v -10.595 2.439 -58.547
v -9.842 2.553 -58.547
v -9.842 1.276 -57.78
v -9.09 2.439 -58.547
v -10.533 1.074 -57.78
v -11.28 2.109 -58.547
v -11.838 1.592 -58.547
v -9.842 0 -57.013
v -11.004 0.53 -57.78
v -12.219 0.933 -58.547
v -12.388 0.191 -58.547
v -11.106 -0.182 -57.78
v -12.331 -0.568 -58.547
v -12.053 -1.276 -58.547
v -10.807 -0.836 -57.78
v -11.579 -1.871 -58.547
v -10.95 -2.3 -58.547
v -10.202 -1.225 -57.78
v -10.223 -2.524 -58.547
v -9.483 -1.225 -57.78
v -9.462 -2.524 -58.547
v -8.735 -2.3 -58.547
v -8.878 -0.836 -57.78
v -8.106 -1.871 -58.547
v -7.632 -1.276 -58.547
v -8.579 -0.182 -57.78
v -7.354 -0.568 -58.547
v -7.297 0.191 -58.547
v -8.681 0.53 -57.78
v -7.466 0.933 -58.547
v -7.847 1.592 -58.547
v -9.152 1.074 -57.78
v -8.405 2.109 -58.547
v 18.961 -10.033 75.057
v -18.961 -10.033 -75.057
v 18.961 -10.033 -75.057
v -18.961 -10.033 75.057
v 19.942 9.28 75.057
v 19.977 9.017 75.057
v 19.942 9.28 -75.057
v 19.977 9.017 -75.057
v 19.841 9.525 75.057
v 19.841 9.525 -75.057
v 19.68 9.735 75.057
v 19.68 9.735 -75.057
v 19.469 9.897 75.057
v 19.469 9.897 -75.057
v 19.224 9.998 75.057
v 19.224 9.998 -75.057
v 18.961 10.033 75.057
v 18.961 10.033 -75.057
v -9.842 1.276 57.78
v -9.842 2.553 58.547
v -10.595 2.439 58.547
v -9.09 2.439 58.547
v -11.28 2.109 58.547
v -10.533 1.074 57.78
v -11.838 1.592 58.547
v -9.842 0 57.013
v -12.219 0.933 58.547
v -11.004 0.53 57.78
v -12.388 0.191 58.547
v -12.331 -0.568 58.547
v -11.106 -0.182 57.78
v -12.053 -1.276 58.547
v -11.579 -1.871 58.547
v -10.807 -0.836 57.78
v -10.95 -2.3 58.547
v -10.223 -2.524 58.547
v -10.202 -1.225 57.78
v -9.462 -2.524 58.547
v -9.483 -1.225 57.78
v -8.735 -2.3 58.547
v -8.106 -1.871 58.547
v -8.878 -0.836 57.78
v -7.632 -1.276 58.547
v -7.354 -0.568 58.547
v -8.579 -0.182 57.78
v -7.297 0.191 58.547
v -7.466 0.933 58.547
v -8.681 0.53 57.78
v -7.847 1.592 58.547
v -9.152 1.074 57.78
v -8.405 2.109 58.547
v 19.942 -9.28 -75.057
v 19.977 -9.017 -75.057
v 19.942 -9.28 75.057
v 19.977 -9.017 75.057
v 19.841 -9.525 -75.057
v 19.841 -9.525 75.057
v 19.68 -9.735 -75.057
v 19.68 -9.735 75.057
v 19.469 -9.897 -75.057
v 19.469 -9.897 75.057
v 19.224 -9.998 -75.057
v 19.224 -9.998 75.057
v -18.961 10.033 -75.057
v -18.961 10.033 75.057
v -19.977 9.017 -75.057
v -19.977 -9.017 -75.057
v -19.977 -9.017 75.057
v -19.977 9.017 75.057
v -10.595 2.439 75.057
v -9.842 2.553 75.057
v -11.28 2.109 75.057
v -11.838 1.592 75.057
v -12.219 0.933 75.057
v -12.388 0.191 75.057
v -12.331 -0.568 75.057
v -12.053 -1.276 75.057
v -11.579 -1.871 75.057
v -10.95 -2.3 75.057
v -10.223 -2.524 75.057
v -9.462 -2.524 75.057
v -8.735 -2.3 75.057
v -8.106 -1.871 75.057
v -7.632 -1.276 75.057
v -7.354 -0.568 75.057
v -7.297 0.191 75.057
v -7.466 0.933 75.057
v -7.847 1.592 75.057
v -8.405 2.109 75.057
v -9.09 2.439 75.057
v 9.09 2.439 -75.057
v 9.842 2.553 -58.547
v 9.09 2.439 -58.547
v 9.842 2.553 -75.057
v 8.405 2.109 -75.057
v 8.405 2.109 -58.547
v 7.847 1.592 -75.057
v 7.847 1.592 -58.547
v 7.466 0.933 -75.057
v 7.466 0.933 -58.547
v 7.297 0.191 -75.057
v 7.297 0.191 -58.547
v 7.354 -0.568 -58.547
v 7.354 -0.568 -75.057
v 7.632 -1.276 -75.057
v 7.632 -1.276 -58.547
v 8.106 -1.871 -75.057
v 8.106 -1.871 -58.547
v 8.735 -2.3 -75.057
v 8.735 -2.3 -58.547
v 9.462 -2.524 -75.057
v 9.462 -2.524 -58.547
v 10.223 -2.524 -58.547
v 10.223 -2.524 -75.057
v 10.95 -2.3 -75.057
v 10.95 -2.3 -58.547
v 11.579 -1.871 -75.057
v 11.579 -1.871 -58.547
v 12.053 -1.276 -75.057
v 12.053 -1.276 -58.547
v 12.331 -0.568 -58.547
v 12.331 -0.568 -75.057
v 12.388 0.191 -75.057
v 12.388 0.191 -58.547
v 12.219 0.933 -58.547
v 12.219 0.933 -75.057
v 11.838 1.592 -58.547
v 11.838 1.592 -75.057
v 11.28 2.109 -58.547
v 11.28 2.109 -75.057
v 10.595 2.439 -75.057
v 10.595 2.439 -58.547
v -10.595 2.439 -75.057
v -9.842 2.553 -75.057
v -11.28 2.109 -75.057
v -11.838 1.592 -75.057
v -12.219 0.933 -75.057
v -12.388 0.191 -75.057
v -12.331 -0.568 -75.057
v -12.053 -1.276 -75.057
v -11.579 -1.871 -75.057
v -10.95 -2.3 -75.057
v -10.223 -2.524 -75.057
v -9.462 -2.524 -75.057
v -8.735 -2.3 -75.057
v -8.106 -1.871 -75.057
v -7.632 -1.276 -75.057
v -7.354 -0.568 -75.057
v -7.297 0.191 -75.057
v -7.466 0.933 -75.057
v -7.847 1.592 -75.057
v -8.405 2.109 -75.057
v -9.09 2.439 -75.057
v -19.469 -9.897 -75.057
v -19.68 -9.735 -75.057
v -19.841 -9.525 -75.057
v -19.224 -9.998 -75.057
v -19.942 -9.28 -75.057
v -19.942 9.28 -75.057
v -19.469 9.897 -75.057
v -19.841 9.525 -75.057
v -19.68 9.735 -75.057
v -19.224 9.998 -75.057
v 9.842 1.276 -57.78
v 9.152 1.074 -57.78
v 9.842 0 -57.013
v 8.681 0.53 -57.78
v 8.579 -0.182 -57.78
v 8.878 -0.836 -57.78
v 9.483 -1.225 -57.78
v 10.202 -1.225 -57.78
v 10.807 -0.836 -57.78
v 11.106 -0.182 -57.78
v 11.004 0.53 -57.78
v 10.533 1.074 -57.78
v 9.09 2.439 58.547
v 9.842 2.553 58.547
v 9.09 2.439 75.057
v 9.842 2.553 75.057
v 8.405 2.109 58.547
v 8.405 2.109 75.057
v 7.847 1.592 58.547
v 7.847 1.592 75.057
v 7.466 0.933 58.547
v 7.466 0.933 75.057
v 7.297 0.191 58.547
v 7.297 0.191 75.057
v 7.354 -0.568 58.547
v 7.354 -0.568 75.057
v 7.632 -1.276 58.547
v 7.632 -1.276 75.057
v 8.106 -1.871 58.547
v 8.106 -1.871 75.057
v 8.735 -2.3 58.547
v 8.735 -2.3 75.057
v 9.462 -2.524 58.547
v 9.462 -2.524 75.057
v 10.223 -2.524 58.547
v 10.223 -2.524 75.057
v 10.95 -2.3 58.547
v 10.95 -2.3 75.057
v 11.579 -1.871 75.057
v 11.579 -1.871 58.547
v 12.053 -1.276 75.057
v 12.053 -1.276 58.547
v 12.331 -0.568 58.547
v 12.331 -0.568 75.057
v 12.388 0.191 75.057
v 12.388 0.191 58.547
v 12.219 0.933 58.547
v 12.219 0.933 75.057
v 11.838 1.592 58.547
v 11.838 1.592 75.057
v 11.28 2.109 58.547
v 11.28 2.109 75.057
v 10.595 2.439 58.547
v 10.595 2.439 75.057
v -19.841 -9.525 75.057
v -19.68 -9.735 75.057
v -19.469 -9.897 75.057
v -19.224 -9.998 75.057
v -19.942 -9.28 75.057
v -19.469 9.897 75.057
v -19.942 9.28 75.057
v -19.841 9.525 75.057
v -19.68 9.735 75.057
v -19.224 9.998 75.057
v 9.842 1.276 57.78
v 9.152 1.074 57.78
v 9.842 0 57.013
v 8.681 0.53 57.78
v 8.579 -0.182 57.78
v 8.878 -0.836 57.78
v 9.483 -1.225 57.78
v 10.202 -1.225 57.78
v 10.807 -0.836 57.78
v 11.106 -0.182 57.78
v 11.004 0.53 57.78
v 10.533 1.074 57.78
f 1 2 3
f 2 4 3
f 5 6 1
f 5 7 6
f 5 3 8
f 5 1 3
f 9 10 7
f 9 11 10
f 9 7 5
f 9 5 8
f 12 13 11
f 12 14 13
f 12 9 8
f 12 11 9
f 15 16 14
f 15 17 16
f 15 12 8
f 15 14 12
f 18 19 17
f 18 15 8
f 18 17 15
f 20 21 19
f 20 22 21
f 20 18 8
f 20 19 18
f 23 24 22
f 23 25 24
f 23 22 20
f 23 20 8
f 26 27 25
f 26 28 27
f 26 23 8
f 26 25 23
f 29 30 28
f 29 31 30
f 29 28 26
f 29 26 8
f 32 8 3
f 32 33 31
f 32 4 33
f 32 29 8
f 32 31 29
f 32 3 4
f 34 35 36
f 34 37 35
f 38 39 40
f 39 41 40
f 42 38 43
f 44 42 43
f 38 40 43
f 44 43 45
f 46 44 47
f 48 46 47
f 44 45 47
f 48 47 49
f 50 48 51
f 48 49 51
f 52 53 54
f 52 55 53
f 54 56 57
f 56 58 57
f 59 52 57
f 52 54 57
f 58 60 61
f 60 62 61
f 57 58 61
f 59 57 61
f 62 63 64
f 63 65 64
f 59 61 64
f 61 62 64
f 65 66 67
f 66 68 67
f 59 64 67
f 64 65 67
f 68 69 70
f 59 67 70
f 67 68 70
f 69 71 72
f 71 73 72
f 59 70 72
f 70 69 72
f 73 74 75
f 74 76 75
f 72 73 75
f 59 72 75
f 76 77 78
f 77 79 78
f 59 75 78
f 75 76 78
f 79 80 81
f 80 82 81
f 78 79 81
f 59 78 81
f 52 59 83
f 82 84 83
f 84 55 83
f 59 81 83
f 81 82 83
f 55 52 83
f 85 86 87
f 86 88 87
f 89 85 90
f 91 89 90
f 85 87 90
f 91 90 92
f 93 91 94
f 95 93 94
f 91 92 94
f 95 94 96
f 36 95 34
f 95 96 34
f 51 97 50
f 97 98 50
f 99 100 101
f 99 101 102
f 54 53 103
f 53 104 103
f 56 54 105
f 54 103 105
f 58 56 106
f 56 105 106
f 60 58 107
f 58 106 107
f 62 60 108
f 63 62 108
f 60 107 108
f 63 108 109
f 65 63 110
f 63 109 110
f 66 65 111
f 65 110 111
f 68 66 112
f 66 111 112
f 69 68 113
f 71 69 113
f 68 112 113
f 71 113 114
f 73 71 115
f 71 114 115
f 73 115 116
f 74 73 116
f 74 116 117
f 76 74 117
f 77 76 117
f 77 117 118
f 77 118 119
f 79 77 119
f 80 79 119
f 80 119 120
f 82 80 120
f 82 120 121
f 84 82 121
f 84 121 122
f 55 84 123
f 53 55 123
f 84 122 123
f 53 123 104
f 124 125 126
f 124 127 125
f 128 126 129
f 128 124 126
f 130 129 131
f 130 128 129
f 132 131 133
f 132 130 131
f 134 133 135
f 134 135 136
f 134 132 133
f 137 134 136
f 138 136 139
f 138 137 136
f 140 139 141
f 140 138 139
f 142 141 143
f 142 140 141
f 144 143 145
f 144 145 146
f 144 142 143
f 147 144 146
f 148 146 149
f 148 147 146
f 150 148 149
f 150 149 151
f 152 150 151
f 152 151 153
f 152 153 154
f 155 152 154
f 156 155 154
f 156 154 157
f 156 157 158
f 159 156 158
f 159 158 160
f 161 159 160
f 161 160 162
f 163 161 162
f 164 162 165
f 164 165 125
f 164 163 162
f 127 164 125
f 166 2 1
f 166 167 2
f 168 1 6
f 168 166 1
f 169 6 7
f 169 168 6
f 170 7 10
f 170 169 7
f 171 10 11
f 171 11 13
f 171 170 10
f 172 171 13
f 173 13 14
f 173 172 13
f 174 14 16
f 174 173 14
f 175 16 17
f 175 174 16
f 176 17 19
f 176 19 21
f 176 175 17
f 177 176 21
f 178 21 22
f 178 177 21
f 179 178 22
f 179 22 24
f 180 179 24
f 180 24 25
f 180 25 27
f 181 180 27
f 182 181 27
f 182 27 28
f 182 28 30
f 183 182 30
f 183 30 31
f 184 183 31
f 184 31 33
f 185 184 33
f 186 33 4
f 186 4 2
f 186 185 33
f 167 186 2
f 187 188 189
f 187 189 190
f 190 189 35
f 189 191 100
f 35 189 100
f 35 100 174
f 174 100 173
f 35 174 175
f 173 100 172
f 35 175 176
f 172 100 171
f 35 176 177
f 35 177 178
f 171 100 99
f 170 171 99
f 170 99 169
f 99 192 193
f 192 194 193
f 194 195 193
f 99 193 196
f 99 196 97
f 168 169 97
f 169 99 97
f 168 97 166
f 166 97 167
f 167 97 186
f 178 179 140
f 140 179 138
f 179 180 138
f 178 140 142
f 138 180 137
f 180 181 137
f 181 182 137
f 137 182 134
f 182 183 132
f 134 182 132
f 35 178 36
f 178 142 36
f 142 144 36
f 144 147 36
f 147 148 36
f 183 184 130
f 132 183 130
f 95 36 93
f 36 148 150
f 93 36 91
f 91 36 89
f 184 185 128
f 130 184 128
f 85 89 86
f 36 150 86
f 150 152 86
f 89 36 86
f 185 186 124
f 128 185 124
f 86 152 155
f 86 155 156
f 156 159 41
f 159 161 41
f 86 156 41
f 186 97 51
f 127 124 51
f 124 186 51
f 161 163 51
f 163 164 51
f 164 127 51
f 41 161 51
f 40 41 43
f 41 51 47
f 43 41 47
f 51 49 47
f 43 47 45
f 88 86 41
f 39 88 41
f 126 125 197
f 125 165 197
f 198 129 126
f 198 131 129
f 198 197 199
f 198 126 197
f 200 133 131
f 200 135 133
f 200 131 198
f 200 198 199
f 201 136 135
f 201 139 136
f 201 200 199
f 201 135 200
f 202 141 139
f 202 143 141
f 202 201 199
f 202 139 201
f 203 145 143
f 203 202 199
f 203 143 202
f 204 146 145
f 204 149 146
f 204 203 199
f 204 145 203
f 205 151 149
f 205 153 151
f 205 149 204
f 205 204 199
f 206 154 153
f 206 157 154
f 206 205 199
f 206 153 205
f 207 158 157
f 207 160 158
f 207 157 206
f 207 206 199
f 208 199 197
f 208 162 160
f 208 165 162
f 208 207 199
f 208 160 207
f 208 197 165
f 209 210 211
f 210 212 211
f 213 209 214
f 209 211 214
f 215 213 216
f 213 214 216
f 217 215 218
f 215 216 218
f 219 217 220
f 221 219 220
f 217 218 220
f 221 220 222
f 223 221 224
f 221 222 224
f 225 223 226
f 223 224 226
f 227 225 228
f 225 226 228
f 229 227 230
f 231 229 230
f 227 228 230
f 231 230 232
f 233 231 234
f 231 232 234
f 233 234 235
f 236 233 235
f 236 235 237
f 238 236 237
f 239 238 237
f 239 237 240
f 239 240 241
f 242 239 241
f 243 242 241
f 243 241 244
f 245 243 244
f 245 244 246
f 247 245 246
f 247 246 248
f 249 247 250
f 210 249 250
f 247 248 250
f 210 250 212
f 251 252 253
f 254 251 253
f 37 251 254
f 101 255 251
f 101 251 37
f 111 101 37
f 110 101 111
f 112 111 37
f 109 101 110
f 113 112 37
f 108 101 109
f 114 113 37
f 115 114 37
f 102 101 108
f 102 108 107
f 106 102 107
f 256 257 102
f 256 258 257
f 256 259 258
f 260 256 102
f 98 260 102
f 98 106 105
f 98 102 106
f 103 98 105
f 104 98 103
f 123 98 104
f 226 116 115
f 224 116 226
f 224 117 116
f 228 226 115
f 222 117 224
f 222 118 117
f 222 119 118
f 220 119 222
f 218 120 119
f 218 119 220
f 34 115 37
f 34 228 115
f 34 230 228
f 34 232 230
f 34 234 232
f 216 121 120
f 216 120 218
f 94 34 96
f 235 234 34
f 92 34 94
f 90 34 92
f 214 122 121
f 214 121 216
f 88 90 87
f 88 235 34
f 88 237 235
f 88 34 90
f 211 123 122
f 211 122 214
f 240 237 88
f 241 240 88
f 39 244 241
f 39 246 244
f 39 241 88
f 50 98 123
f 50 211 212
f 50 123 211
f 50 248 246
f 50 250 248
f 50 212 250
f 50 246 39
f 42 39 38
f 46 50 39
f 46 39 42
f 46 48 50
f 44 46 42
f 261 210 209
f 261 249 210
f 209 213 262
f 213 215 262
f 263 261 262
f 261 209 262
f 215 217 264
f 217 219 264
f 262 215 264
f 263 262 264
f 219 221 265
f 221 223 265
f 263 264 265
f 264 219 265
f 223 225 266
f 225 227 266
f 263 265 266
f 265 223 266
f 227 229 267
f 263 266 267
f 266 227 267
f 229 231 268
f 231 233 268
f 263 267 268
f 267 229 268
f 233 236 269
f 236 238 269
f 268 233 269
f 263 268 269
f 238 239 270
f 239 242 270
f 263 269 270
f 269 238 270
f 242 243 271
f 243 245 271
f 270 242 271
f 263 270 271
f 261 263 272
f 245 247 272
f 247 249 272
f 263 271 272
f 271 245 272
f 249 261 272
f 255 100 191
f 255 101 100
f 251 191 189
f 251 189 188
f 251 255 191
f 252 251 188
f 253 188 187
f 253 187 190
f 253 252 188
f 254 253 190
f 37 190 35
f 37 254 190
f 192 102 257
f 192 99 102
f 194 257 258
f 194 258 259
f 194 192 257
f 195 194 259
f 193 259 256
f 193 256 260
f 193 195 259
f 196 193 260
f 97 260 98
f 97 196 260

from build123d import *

# Parameters (mm, degrees)
SKETCH1_W                        = 39.9542
SKETCH1_H                        = 20.066
BOSS_EXTRUDE1_DEPTH              = 75.057
FILLET1_R                        = 1.016
F_1_4_20_TAPPED_HOLE1_AT_2_COUNT = 2
F_1_4_20_TAPPED_HOLE1_AT_2_PITCH = 19.685


with BuildPart() as part:
    # Sketch1 → Boss-Extrude1 (new, symmetric)
    with BuildSketch(Plane.XY):
        Rectangle(SKETCH1_W, SKETCH1_H)
    extrude(amount=BOSS_EXTRUDE1_DEPTH, both=True)

    # Fillet1
    fillet1_edges = [part.edges().sort_by_distance(p)[0] for p in [
        (19.9771, -10.033, 0),
        (-19.9771, -10.033, 0),
        (-19.9771, 10.033, 0),
        (19.9771, 10.033, 0),
    ]]
    fillet(fillet1_edges, radius=FILLET1_R)

    # Sketch4 → 1/4-20 Tapped Hole1 (revolve, cut)
    with BuildSketch(Plane(origin=(9.8425, 0, -75.057), x_dir=(0, 1, 0), z_dir=(1, 0, 0))):
        Polygon((0, 0), (0, 18.043816902), (2.5527, 16.51), (2.5527, 0), align=None)
    f_1_4_20_tapped_hole1 = revolve(axis=Axis((9.8425, 0, -81.407), (0, 0, 1)), mode=Mode.SUBTRACT)

    # 1/4-20 Tapped Hole1 at 2: 1/4-20 Tapped Hole1 ×2
    with Locations(*[(-i * F_1_4_20_TAPPED_HOLE1_AT_2_PITCH, 0, 0) for i in range(1, F_1_4_20_TAPPED_HOLE1_AT_2_COUNT)]):
        add(f_1_4_20_tapped_hole1, mode=Mode.SUBTRACT)

    # Mirror1: 1/4-20 Tapped Hole1 across plane
    add(f_1_4_20_tapped_hole1.mirror(Plane.XY), mode=Mode.SUBTRACT)

    # Mirror1 copy 1 sketch → Mirror1 copy 1 (revolve, cut)
    with BuildSketch(Plane(origin=(-9.8425, 0, 75.057), x_dir=(0, 1, 0), z_dir=(1, 0, 0))):
        Polygon((0, 0), (0, -18.043816902), (2.5527, -16.51), (2.5527, 0), align=None)
    revolve(axis=Axis((-9.8425, 0, 81.407), (0, 0, 1)), mode=Mode.SUBTRACT)


solid = part.part
